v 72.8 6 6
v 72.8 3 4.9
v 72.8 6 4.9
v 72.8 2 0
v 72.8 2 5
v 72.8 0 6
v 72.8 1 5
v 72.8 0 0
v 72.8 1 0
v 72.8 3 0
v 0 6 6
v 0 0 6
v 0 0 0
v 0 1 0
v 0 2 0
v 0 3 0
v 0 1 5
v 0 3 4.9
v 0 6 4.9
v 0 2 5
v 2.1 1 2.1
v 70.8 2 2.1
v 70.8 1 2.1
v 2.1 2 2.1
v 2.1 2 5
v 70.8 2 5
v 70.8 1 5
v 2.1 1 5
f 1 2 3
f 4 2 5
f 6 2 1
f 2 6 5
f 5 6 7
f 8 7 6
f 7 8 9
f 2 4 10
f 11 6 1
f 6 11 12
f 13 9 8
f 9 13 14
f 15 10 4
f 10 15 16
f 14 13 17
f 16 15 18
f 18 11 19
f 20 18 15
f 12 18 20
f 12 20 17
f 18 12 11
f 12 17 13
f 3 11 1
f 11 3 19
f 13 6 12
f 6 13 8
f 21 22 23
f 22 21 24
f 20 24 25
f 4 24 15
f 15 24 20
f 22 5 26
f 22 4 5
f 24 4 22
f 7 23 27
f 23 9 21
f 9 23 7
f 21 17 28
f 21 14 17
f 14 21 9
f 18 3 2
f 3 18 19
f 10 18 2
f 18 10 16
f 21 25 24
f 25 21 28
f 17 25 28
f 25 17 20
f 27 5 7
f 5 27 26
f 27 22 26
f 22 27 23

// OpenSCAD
WSCR = 73 - .2; // Width of the display's visible part.
MDISP = 3; // Width of the display's margin.
H = 6; // Height of the panel.
TFINGER = 2.1; // Depth of the groove that locks the panel in place.
WALL = 1; // Thickness of the walls.

module translucy() {
  color("white", alpha=.5)
    difference() {
      cube([WSCR, H, H]);
      translate([-.1, WALL, -.1])
        cube([WSCR + .2, WALL, TFINGER + .1]);
      translate([-.1, H - MDISP, -.1])
        cube([WSCR + .2, 10, H - WALL]);
      translate([-.1, WALL, 0])
        cube([TFINGER + .1, WALL, H - WALL]);
      translate([WSCR - TFINGER + .1, WALL, 0])
        cube([TFINGER + .1, WALL, H - WALL]);
    }
}

translucy();
